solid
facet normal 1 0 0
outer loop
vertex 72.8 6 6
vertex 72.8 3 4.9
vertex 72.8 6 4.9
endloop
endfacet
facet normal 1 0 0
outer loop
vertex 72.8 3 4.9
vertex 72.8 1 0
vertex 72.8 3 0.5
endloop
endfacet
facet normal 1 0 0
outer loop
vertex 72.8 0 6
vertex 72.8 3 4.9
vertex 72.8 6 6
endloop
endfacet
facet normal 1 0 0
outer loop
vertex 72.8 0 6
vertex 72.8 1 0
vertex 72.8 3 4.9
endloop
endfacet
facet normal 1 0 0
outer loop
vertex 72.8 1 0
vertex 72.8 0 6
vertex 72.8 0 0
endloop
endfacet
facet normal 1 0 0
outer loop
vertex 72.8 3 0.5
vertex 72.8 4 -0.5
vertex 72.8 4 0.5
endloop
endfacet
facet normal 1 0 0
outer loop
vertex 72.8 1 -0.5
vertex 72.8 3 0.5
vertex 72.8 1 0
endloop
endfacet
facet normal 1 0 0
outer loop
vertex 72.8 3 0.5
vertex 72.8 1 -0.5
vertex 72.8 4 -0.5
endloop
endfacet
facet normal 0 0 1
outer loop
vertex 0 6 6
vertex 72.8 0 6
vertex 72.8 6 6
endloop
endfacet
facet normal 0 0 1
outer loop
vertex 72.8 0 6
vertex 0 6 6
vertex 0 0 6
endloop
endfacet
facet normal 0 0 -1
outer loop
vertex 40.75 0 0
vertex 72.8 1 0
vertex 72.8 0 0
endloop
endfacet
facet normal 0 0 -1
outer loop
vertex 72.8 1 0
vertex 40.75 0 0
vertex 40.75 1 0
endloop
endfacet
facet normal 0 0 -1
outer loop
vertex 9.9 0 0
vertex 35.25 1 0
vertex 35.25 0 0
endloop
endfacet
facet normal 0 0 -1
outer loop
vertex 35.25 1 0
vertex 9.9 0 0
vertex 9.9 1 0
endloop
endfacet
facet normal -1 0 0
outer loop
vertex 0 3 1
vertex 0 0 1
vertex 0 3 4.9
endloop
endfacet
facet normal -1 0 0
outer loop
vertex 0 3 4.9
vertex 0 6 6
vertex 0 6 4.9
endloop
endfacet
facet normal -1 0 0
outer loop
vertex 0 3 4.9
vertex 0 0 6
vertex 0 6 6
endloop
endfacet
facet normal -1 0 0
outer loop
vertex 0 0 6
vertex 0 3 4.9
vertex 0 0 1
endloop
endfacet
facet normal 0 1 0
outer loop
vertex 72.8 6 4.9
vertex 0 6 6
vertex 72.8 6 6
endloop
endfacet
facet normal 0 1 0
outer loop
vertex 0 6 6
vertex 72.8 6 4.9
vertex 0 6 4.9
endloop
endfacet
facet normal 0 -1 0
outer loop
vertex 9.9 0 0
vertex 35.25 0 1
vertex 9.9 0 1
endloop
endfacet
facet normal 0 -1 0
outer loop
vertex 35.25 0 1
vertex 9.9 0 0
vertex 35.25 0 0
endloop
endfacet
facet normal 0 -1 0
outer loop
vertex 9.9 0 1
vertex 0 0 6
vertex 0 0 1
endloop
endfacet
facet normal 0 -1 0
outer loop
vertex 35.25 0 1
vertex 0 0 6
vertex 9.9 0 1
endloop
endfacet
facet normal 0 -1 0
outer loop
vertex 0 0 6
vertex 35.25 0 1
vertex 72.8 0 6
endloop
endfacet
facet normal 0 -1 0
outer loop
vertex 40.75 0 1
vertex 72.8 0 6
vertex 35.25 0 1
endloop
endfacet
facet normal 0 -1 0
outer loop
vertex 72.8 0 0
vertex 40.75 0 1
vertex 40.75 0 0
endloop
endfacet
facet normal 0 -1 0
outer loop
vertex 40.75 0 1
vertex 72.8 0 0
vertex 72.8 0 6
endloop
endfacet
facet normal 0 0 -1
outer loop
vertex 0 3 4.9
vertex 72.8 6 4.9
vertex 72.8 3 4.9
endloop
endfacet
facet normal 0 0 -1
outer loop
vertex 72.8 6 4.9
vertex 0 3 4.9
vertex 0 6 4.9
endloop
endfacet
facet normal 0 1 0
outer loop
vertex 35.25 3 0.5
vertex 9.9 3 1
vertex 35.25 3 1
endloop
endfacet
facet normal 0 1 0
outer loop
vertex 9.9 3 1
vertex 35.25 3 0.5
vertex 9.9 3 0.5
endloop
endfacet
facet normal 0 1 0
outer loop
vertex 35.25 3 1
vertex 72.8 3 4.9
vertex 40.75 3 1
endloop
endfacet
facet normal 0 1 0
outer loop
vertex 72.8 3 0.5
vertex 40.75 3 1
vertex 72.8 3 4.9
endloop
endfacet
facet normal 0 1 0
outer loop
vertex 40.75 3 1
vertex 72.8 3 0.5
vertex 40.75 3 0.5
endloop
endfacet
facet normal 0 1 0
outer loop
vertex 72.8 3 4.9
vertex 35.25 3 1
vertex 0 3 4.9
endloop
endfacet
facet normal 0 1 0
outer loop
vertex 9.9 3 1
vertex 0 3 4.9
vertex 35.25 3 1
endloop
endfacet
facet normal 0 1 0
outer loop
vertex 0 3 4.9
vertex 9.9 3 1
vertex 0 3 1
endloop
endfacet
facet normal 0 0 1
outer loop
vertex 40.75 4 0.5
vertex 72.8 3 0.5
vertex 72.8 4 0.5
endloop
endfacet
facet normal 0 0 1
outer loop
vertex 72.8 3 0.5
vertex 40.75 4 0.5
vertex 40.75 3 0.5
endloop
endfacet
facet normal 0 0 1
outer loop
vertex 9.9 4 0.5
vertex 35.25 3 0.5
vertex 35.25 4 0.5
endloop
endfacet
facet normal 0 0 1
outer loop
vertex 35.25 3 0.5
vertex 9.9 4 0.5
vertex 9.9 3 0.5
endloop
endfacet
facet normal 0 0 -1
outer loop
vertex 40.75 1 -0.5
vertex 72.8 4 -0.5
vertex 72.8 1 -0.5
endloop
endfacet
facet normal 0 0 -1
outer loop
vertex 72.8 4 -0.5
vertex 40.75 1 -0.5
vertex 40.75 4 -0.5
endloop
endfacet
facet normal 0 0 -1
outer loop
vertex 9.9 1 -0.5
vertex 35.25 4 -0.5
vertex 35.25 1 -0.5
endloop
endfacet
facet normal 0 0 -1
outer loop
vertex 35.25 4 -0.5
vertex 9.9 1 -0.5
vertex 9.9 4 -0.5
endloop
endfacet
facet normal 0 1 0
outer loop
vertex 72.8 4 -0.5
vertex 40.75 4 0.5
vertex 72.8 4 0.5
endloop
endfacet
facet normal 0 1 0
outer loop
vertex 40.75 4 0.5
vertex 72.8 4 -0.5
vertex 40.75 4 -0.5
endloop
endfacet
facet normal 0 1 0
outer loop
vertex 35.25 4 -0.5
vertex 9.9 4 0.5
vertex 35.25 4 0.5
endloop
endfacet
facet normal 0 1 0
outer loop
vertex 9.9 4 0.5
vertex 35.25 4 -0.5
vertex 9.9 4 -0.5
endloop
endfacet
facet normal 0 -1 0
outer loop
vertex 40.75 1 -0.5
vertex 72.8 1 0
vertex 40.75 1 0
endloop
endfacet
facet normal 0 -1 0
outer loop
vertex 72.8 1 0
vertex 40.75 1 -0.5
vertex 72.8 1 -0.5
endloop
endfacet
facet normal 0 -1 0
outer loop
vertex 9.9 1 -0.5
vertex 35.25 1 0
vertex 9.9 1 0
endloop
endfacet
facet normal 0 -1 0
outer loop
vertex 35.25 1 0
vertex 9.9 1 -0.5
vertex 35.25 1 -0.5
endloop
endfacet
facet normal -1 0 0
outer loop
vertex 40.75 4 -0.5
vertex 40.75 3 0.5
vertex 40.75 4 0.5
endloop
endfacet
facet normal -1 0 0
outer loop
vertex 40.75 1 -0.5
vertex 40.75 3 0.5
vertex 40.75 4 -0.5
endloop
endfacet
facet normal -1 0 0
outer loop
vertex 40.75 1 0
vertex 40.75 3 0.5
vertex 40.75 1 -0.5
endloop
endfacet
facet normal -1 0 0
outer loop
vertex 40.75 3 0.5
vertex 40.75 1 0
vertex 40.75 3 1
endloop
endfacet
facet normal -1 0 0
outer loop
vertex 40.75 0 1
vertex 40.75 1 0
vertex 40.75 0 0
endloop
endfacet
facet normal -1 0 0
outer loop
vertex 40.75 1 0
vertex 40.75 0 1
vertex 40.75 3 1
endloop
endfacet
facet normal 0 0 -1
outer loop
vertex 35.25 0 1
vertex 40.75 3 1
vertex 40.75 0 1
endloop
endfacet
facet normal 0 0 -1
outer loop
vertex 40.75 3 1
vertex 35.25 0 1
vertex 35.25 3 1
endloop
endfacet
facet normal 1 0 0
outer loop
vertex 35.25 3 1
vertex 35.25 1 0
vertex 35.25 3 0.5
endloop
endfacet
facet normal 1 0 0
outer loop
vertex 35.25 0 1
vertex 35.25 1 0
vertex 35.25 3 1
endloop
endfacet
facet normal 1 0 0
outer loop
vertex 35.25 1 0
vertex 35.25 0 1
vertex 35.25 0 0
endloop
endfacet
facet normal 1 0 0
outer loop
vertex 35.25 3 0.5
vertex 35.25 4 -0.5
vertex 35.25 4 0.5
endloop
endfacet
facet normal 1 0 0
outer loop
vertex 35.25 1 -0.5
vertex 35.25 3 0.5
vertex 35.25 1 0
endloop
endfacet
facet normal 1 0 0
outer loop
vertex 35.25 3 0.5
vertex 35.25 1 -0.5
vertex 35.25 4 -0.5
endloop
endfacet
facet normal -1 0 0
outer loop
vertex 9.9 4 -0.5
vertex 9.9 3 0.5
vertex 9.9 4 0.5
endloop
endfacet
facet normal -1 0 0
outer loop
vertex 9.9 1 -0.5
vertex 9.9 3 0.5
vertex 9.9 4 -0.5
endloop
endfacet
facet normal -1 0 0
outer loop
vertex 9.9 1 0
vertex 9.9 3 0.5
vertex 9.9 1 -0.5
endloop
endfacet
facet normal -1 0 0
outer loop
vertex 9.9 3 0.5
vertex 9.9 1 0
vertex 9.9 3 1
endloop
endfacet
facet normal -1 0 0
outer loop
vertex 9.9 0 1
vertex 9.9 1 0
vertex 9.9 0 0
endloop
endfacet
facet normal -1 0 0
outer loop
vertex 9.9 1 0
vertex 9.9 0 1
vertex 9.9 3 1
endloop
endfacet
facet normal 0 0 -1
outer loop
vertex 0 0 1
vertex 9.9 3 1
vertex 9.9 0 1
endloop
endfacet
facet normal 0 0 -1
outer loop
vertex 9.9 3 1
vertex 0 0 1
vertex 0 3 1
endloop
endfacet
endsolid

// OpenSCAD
WSCR = 73 - .2; // Width of the display's visible part.
MDISP = 3; // Width of the display's margin.
H = 6; // Height of the panel.
TFINGER = 3; // Depth of the groove that locks the panel in place.
WFINGER = 10;
WALL = 1; // Thickness of the walls.

module corner_bottom() {
  color("white")
    difference() {
      union() {
        difference() {
          cube([WSCR, H, H]);
          translate([-.1, H - MDISP, -.1])
            cube([WSCR + .2, 10, H - WALL]);
        }
        translate([0, 1, -.5])
          cube([WSCR, 3, 1]);
      }
      translate([(WSCR - 2.3) / 2, -.01, -1])
        cube([5.5, 10, 2]);
      translate([-.1, -.01, -2])
        cube([10, 10, 3]);
    }
}

corner_bottom();
